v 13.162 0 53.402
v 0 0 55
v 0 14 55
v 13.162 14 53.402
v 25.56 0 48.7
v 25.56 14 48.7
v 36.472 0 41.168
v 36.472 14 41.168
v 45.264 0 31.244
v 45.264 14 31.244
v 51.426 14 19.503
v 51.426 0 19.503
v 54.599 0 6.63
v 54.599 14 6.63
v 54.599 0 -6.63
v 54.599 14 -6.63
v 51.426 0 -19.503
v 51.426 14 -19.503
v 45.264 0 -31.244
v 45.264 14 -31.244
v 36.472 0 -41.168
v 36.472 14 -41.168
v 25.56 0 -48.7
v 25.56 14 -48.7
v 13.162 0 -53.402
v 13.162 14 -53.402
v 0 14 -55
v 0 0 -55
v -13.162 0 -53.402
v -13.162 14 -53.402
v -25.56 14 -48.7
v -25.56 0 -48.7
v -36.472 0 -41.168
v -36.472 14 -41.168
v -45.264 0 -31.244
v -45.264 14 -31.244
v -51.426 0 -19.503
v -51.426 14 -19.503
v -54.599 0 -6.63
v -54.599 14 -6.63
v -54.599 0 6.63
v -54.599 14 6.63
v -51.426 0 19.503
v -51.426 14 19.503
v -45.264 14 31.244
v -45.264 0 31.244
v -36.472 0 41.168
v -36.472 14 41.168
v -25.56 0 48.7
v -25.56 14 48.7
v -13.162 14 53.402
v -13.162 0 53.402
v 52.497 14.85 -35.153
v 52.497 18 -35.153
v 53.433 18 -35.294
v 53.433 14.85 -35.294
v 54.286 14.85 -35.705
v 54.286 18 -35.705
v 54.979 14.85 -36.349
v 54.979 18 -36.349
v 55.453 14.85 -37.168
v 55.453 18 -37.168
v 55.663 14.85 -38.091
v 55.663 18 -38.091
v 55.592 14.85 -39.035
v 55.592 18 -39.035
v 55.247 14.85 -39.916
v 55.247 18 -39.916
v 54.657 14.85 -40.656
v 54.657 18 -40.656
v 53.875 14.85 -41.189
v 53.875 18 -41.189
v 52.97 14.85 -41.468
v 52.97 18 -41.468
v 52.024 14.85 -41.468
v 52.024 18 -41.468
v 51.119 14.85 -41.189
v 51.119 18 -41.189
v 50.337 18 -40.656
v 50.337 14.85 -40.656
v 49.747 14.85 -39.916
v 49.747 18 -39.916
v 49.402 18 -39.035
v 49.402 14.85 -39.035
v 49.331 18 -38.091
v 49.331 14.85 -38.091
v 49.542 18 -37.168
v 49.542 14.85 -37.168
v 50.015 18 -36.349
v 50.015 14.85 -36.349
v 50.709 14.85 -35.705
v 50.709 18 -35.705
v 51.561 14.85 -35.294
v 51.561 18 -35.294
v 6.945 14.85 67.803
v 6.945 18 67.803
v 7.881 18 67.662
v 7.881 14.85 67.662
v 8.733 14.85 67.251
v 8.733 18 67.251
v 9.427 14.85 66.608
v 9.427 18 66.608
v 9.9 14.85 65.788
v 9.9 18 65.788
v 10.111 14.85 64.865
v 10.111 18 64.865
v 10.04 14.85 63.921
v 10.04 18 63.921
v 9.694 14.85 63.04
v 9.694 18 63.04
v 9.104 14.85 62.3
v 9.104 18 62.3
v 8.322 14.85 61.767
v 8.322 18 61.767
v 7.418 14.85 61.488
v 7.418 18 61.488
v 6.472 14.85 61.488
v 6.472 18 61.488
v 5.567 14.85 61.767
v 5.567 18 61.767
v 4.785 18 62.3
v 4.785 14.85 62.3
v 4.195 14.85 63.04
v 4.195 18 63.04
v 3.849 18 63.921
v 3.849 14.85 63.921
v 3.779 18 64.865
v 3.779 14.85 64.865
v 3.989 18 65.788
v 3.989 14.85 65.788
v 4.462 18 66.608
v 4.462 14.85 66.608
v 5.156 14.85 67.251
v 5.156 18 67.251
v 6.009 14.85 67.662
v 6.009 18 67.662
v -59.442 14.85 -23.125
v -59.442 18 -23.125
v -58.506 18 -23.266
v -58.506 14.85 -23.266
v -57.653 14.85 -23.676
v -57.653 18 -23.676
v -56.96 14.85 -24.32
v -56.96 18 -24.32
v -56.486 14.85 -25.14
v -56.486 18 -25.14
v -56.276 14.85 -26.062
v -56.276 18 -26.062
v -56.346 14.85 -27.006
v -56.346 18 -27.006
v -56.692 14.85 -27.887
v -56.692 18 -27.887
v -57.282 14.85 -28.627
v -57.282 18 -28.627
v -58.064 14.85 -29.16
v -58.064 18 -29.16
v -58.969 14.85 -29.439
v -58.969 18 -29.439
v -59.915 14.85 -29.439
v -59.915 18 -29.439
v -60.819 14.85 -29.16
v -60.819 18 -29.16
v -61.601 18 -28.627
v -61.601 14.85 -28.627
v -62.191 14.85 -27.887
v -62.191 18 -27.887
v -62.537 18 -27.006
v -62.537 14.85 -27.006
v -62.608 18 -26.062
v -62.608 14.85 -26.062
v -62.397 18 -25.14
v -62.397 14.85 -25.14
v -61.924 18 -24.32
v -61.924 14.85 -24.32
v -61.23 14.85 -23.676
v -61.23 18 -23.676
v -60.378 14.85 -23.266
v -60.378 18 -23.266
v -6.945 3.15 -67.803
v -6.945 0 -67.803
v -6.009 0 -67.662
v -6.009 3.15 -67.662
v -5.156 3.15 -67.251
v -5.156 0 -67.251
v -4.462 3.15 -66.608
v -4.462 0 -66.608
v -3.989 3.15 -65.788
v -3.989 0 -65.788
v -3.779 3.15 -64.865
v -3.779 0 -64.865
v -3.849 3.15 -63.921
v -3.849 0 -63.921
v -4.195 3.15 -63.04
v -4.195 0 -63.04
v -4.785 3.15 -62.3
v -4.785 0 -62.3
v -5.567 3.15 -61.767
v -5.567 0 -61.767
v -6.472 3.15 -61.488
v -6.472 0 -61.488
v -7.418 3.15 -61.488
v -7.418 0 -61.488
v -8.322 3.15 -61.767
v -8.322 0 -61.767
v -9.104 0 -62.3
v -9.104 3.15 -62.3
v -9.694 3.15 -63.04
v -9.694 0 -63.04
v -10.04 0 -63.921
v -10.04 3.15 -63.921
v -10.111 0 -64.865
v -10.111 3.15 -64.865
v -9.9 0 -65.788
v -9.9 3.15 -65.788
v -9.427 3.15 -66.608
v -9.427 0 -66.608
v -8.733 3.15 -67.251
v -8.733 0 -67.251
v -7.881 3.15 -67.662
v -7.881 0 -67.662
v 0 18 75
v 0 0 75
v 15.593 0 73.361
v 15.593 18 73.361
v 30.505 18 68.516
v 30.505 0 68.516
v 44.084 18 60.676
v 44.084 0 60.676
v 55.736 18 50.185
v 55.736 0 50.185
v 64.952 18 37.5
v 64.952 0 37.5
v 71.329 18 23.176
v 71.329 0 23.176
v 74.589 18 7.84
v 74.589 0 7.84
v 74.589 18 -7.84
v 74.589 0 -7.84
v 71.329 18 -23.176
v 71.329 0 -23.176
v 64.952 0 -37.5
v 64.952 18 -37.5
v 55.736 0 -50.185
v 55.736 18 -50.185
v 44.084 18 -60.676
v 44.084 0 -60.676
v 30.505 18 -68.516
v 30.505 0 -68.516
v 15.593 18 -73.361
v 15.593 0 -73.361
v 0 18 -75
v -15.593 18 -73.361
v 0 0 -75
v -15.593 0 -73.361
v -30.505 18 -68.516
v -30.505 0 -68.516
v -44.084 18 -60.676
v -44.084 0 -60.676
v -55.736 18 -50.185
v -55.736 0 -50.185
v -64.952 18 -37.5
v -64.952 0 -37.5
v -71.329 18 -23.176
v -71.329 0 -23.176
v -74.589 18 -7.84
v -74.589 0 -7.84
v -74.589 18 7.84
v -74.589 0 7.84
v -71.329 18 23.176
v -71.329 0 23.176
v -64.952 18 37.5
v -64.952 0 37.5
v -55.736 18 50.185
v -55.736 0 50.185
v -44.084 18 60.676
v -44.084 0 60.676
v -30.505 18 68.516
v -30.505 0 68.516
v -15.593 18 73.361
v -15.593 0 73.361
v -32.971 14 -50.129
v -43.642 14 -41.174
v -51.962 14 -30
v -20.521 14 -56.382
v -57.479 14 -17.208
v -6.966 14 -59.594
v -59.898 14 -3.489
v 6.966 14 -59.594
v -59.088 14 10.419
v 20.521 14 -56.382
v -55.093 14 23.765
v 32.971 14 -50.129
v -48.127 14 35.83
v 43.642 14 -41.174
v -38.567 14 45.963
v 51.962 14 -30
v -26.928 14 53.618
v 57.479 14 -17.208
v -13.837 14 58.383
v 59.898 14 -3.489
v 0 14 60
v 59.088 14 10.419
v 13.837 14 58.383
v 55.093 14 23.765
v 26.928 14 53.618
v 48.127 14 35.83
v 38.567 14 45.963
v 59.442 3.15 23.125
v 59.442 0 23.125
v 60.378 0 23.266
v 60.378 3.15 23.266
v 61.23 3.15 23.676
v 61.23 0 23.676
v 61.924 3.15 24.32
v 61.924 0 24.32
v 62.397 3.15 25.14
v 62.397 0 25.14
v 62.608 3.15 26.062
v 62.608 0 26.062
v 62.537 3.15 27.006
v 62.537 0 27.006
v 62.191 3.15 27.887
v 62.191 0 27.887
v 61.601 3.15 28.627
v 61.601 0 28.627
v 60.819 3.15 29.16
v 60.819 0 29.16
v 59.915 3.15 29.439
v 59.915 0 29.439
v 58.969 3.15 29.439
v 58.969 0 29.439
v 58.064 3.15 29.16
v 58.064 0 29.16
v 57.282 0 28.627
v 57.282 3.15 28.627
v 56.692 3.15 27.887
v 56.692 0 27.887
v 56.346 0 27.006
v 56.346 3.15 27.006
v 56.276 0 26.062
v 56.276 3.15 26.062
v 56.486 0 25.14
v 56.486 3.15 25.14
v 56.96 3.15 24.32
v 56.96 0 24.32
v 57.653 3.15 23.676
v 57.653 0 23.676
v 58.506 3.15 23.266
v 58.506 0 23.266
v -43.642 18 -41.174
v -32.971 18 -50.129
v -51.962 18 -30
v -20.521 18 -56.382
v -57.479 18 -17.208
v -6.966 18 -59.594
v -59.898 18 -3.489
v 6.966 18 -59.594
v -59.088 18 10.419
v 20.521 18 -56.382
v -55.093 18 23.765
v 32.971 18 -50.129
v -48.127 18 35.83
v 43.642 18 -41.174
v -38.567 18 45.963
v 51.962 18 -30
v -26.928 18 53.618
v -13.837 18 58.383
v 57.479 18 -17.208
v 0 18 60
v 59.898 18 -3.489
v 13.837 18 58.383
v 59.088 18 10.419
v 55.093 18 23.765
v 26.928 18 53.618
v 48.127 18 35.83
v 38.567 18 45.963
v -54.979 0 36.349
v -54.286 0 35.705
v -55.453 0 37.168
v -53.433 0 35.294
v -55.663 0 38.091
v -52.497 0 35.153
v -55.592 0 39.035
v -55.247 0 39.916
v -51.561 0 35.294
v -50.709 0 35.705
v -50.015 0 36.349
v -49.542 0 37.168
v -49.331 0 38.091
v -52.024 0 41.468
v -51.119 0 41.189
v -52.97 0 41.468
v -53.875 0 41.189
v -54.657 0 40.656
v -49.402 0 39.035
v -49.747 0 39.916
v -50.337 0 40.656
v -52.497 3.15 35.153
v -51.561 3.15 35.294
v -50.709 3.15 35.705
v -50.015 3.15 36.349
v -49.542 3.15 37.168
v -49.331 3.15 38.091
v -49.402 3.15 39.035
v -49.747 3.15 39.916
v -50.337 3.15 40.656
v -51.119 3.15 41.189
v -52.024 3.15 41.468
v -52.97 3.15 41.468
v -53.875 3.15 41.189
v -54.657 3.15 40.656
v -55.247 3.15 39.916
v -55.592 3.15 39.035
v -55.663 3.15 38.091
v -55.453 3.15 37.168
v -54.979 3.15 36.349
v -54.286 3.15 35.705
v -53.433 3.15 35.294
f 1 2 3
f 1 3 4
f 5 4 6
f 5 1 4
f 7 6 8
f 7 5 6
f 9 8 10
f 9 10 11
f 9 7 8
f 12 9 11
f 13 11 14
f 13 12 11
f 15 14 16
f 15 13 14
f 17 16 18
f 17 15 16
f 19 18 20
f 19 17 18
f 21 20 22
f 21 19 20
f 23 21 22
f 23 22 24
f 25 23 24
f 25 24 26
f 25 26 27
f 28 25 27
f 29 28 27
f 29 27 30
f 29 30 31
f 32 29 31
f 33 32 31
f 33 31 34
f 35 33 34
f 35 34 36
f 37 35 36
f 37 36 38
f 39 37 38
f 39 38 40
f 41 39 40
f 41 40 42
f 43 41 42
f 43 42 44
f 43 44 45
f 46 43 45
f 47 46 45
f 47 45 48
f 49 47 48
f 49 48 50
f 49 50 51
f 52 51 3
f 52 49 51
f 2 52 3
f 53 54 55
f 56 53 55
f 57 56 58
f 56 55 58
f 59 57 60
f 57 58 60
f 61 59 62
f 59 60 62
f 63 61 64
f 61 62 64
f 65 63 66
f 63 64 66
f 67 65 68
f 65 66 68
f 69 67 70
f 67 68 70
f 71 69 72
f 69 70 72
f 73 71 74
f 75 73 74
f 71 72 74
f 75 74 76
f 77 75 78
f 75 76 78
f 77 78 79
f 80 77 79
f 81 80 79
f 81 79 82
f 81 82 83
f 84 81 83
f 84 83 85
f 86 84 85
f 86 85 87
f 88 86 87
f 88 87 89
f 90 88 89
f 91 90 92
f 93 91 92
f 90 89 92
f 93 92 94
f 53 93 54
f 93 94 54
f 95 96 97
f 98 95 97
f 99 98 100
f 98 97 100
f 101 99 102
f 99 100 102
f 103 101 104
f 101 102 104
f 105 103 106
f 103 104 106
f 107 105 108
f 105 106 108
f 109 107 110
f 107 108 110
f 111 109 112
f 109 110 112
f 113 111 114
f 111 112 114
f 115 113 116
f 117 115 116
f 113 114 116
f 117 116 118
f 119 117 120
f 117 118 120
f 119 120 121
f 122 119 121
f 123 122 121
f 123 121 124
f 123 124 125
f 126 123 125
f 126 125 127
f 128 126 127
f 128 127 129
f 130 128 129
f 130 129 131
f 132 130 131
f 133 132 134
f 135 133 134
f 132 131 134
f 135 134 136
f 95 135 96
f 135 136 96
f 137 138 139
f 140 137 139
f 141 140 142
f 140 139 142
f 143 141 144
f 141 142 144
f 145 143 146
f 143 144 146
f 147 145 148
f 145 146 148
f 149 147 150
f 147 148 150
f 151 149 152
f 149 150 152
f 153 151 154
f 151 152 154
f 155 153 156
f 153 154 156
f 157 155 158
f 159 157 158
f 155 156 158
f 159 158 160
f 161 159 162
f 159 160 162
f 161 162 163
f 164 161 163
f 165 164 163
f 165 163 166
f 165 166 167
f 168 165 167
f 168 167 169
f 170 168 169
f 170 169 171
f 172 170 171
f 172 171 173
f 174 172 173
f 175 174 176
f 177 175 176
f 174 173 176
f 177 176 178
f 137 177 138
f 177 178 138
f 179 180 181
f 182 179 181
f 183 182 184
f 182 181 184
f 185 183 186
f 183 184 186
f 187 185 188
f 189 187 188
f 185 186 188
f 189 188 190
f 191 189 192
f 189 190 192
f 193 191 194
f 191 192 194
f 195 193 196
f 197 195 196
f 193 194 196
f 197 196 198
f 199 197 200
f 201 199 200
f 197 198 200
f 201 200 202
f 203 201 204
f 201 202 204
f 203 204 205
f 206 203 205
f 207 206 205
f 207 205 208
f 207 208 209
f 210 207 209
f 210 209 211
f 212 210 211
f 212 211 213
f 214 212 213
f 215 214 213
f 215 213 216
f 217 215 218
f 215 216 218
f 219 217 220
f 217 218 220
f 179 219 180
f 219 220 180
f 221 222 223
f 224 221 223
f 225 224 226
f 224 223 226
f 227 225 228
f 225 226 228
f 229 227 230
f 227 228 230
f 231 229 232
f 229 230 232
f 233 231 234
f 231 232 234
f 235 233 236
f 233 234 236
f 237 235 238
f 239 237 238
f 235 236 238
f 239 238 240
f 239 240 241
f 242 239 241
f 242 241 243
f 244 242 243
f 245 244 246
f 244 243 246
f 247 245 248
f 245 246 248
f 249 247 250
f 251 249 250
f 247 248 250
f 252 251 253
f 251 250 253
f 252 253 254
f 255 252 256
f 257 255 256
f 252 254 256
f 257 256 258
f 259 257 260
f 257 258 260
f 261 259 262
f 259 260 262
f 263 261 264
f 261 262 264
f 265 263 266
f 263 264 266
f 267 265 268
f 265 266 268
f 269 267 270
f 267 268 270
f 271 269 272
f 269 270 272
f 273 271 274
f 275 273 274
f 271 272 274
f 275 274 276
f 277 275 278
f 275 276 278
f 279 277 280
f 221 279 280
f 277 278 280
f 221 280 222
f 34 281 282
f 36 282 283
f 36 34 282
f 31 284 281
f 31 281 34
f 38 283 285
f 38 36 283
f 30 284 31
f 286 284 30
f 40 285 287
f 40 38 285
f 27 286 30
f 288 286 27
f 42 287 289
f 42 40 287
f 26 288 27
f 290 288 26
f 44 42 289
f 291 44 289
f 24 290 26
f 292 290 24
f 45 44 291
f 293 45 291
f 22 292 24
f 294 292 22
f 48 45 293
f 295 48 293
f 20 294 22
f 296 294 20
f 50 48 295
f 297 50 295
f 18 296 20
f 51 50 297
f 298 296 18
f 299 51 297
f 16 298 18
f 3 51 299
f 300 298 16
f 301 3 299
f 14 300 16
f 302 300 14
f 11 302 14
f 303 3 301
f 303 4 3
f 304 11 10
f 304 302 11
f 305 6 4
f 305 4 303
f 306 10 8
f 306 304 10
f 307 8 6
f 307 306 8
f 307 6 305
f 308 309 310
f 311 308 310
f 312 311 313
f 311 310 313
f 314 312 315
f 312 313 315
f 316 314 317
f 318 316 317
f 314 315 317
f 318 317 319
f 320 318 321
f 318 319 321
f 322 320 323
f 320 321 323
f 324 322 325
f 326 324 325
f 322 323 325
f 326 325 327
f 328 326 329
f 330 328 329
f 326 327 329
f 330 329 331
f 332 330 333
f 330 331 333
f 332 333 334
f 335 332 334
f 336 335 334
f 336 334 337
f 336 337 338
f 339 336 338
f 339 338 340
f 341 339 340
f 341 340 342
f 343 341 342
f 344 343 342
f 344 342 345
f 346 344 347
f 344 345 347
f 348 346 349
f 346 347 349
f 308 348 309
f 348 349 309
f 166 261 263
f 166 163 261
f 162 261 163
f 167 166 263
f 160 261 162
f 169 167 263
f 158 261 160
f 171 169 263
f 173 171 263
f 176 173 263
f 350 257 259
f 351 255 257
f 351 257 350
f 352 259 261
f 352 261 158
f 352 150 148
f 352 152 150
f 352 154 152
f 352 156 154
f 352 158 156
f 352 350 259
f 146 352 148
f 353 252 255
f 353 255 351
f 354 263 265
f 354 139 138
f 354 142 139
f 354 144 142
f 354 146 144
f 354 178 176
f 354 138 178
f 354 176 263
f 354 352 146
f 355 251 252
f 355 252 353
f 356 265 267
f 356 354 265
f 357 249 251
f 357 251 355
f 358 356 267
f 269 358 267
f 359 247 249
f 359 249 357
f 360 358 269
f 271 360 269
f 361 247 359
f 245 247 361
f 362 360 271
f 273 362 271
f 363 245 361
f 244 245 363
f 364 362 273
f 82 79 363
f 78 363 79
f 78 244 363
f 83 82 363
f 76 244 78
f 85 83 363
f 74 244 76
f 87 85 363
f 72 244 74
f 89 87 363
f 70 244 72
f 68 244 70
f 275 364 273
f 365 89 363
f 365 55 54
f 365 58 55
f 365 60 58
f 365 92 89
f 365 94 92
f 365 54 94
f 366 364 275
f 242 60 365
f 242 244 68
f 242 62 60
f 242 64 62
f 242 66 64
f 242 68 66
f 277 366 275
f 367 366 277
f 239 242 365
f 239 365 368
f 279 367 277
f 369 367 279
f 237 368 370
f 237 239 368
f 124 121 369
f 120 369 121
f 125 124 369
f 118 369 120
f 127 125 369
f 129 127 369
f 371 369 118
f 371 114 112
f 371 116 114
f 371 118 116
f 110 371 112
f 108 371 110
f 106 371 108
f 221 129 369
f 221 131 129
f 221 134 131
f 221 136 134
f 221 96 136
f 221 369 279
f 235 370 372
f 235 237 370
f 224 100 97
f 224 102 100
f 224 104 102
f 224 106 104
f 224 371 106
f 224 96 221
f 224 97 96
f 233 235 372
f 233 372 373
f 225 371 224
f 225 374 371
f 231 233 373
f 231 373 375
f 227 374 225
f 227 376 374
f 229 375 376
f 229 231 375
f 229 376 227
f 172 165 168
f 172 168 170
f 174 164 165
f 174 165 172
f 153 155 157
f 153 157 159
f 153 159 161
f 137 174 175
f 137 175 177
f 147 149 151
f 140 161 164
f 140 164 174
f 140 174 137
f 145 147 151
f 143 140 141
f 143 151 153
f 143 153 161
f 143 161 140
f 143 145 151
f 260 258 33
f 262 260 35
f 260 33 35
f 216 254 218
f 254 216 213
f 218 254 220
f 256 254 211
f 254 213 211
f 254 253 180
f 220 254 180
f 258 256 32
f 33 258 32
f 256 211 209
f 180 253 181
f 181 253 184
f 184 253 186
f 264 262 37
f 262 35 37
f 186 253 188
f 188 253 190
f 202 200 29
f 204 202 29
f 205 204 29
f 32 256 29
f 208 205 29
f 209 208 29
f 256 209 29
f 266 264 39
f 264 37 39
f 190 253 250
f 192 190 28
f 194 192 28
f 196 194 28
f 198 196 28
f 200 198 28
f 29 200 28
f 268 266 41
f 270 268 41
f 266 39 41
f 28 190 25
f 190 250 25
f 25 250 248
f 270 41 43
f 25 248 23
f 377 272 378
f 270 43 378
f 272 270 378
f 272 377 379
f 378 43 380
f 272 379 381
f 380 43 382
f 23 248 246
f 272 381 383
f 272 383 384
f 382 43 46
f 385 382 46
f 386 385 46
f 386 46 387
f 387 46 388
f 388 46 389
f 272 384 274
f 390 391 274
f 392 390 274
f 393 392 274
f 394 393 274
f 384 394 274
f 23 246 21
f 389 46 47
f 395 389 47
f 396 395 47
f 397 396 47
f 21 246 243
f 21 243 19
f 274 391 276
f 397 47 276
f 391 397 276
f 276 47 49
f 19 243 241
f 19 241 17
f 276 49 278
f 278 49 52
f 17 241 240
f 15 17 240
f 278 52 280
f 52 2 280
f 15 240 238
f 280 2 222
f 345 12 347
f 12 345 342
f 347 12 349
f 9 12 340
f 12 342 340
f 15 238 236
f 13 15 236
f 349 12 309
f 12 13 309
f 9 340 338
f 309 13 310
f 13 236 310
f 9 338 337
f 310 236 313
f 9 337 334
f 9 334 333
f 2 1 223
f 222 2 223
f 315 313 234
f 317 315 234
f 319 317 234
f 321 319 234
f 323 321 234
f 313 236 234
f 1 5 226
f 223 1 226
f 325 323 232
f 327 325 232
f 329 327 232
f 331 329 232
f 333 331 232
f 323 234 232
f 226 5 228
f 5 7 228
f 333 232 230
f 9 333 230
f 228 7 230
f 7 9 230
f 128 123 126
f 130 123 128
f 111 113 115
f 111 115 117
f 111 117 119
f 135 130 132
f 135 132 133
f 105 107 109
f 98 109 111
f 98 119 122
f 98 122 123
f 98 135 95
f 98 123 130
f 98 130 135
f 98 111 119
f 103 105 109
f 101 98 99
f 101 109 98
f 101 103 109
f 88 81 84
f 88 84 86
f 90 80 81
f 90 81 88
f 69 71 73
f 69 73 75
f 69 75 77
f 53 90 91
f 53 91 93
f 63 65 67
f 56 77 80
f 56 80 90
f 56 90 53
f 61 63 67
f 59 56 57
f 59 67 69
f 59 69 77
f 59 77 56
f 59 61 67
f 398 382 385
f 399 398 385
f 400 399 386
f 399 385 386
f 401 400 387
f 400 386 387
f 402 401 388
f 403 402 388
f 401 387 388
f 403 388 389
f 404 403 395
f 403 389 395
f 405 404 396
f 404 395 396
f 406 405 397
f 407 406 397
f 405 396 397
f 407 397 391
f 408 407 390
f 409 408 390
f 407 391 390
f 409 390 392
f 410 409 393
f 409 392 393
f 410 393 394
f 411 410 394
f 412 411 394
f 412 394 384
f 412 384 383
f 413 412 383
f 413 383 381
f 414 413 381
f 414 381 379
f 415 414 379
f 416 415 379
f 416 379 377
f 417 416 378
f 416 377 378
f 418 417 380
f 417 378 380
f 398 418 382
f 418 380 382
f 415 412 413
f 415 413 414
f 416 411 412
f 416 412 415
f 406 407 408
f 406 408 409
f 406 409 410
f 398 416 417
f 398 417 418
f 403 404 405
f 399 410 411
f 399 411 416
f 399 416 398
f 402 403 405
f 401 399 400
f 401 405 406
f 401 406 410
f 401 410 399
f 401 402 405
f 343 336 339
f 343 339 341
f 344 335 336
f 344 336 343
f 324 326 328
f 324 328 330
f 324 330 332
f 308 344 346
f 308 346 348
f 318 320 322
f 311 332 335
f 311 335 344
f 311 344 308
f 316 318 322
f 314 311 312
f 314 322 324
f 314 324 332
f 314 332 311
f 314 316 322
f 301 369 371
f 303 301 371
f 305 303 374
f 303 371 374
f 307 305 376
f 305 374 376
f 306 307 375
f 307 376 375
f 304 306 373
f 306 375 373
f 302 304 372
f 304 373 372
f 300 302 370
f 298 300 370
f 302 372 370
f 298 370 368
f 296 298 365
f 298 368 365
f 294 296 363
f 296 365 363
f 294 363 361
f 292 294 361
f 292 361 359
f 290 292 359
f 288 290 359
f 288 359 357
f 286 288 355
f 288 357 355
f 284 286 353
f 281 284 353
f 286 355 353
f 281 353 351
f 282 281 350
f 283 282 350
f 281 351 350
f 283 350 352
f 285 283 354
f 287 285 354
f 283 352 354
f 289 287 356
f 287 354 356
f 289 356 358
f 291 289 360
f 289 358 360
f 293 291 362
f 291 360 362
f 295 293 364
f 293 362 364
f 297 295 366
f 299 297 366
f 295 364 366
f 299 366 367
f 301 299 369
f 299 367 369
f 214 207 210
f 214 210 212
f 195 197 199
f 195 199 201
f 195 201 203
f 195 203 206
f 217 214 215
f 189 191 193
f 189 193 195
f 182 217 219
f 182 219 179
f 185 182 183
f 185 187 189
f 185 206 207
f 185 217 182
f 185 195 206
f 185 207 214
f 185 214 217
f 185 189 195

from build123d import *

# Parameters (mm, degrees)
ESQUISSE1_R             = 75
ESQUISSE1_R_2           = 55
BOSS_EXTRU_3_DEPTH      = 18
ESQUISSE6_R             = 60
ESQUISSE6_R_2           = 55
ENL_V_MAT_EXTRU_2_DEPTH = 4
ESQUISSE5_R             = 3.175
ENL_V_MAT_EXTRU_1_DEPTH = 3.15
ESQUISSE9_R             = 3.175
ENL_V_MAT_EXTRU_3_DEPTH = 3.15


with BuildPart() as part:
    # Esquisse1 → Boss.-Extru.3 (new body)
    with BuildSketch(Plane(origin=(0, 0, 0), x_dir=(1, 0, 0), z_dir=(0, 1, 0))):
        with Locations(Location((0, 0, 0), (0, 0, 270))):  # turned: the seam where the file's is
            Circle(ESQUISSE1_R)
        with Locations(Location((0, 0, 0), (0, 0, 270))):  # turned: the seam where the file's is
            Circle(ESQUISSE1_R_2, mode=Mode.SUBTRACT)
    extrude(amount=BOSS_EXTRU_3_DEPTH)

    # Esquisse6 → Enlèv. mat.-Extru.2 (cut)
    with BuildSketch(Plane(origin=(0, 18, 0), x_dir=(1, 0, 0), z_dir=(0, 1, 0))):
        with Locations(Location((0, 0, 0), (0, 0, 270))):  # turned: the seam where the file's is
            Circle(ESQUISSE6_R)
        with Locations(Location((0, 0, 0), (0, 0, 270))):  # turned: the seam where the file's is
            Circle(ESQUISSE6_R_2, mode=Mode.SUBTRACT)
    extrude(amount=-ENL_V_MAT_EXTRU_2_DEPTH, mode=Mode.SUBTRACT)

    # Esquisse5 → Enlèv. mat.-Extru.1 (cut)
    with BuildSketch(Plane(origin=(0, 18, 0), x_dir=(1, 0, 0), z_dir=(0, 1, 0))):
        with Locations(Location((-59.441823855, 26.299611723, 0), (0, 0, 270))):  # turned: the seam where the file's is
            Circle(ESQUISSE5_R)
        with Locations(Location((52.497043789, 38.328323645, 0), (0, 0, 270))):  # turned: the seam where the file's is
            Circle(ESQUISSE5_R)
        with Locations(Location((6.944780066, -64.627935367, 0), (0, 0, 270))):  # turned: the seam where the file's is
            Circle(ESQUISSE5_R)
    extrude(amount=-ENL_V_MAT_EXTRU_1_DEPTH, mode=Mode.SUBTRACT)

    # Esquisse9 → Enlèv. mat.-Extru.3 (cut)
    with BuildSketch(Plane.XZ):
        with Locations(Location((59.441823855, 26.299611723, 0), (0, 0, 270))):  # turned: the seam where the file's is
            Circle(ESQUISSE9_R)
        with Locations(Location((-6.944780066, -64.627935367, 0), (0, 0, 270))):  # turned: the seam where the file's is
            Circle(ESQUISSE9_R)
        with Locations(Location((-52.497043789, 38.328323645, 0), (0, 0, 270))):  # turned: the seam where the file's is
            Circle(ESQUISSE9_R)
    extrude(amount=-ENL_V_MAT_EXTRU_3_DEPTH, mode=Mode.SUBTRACT)


solid = part.part
